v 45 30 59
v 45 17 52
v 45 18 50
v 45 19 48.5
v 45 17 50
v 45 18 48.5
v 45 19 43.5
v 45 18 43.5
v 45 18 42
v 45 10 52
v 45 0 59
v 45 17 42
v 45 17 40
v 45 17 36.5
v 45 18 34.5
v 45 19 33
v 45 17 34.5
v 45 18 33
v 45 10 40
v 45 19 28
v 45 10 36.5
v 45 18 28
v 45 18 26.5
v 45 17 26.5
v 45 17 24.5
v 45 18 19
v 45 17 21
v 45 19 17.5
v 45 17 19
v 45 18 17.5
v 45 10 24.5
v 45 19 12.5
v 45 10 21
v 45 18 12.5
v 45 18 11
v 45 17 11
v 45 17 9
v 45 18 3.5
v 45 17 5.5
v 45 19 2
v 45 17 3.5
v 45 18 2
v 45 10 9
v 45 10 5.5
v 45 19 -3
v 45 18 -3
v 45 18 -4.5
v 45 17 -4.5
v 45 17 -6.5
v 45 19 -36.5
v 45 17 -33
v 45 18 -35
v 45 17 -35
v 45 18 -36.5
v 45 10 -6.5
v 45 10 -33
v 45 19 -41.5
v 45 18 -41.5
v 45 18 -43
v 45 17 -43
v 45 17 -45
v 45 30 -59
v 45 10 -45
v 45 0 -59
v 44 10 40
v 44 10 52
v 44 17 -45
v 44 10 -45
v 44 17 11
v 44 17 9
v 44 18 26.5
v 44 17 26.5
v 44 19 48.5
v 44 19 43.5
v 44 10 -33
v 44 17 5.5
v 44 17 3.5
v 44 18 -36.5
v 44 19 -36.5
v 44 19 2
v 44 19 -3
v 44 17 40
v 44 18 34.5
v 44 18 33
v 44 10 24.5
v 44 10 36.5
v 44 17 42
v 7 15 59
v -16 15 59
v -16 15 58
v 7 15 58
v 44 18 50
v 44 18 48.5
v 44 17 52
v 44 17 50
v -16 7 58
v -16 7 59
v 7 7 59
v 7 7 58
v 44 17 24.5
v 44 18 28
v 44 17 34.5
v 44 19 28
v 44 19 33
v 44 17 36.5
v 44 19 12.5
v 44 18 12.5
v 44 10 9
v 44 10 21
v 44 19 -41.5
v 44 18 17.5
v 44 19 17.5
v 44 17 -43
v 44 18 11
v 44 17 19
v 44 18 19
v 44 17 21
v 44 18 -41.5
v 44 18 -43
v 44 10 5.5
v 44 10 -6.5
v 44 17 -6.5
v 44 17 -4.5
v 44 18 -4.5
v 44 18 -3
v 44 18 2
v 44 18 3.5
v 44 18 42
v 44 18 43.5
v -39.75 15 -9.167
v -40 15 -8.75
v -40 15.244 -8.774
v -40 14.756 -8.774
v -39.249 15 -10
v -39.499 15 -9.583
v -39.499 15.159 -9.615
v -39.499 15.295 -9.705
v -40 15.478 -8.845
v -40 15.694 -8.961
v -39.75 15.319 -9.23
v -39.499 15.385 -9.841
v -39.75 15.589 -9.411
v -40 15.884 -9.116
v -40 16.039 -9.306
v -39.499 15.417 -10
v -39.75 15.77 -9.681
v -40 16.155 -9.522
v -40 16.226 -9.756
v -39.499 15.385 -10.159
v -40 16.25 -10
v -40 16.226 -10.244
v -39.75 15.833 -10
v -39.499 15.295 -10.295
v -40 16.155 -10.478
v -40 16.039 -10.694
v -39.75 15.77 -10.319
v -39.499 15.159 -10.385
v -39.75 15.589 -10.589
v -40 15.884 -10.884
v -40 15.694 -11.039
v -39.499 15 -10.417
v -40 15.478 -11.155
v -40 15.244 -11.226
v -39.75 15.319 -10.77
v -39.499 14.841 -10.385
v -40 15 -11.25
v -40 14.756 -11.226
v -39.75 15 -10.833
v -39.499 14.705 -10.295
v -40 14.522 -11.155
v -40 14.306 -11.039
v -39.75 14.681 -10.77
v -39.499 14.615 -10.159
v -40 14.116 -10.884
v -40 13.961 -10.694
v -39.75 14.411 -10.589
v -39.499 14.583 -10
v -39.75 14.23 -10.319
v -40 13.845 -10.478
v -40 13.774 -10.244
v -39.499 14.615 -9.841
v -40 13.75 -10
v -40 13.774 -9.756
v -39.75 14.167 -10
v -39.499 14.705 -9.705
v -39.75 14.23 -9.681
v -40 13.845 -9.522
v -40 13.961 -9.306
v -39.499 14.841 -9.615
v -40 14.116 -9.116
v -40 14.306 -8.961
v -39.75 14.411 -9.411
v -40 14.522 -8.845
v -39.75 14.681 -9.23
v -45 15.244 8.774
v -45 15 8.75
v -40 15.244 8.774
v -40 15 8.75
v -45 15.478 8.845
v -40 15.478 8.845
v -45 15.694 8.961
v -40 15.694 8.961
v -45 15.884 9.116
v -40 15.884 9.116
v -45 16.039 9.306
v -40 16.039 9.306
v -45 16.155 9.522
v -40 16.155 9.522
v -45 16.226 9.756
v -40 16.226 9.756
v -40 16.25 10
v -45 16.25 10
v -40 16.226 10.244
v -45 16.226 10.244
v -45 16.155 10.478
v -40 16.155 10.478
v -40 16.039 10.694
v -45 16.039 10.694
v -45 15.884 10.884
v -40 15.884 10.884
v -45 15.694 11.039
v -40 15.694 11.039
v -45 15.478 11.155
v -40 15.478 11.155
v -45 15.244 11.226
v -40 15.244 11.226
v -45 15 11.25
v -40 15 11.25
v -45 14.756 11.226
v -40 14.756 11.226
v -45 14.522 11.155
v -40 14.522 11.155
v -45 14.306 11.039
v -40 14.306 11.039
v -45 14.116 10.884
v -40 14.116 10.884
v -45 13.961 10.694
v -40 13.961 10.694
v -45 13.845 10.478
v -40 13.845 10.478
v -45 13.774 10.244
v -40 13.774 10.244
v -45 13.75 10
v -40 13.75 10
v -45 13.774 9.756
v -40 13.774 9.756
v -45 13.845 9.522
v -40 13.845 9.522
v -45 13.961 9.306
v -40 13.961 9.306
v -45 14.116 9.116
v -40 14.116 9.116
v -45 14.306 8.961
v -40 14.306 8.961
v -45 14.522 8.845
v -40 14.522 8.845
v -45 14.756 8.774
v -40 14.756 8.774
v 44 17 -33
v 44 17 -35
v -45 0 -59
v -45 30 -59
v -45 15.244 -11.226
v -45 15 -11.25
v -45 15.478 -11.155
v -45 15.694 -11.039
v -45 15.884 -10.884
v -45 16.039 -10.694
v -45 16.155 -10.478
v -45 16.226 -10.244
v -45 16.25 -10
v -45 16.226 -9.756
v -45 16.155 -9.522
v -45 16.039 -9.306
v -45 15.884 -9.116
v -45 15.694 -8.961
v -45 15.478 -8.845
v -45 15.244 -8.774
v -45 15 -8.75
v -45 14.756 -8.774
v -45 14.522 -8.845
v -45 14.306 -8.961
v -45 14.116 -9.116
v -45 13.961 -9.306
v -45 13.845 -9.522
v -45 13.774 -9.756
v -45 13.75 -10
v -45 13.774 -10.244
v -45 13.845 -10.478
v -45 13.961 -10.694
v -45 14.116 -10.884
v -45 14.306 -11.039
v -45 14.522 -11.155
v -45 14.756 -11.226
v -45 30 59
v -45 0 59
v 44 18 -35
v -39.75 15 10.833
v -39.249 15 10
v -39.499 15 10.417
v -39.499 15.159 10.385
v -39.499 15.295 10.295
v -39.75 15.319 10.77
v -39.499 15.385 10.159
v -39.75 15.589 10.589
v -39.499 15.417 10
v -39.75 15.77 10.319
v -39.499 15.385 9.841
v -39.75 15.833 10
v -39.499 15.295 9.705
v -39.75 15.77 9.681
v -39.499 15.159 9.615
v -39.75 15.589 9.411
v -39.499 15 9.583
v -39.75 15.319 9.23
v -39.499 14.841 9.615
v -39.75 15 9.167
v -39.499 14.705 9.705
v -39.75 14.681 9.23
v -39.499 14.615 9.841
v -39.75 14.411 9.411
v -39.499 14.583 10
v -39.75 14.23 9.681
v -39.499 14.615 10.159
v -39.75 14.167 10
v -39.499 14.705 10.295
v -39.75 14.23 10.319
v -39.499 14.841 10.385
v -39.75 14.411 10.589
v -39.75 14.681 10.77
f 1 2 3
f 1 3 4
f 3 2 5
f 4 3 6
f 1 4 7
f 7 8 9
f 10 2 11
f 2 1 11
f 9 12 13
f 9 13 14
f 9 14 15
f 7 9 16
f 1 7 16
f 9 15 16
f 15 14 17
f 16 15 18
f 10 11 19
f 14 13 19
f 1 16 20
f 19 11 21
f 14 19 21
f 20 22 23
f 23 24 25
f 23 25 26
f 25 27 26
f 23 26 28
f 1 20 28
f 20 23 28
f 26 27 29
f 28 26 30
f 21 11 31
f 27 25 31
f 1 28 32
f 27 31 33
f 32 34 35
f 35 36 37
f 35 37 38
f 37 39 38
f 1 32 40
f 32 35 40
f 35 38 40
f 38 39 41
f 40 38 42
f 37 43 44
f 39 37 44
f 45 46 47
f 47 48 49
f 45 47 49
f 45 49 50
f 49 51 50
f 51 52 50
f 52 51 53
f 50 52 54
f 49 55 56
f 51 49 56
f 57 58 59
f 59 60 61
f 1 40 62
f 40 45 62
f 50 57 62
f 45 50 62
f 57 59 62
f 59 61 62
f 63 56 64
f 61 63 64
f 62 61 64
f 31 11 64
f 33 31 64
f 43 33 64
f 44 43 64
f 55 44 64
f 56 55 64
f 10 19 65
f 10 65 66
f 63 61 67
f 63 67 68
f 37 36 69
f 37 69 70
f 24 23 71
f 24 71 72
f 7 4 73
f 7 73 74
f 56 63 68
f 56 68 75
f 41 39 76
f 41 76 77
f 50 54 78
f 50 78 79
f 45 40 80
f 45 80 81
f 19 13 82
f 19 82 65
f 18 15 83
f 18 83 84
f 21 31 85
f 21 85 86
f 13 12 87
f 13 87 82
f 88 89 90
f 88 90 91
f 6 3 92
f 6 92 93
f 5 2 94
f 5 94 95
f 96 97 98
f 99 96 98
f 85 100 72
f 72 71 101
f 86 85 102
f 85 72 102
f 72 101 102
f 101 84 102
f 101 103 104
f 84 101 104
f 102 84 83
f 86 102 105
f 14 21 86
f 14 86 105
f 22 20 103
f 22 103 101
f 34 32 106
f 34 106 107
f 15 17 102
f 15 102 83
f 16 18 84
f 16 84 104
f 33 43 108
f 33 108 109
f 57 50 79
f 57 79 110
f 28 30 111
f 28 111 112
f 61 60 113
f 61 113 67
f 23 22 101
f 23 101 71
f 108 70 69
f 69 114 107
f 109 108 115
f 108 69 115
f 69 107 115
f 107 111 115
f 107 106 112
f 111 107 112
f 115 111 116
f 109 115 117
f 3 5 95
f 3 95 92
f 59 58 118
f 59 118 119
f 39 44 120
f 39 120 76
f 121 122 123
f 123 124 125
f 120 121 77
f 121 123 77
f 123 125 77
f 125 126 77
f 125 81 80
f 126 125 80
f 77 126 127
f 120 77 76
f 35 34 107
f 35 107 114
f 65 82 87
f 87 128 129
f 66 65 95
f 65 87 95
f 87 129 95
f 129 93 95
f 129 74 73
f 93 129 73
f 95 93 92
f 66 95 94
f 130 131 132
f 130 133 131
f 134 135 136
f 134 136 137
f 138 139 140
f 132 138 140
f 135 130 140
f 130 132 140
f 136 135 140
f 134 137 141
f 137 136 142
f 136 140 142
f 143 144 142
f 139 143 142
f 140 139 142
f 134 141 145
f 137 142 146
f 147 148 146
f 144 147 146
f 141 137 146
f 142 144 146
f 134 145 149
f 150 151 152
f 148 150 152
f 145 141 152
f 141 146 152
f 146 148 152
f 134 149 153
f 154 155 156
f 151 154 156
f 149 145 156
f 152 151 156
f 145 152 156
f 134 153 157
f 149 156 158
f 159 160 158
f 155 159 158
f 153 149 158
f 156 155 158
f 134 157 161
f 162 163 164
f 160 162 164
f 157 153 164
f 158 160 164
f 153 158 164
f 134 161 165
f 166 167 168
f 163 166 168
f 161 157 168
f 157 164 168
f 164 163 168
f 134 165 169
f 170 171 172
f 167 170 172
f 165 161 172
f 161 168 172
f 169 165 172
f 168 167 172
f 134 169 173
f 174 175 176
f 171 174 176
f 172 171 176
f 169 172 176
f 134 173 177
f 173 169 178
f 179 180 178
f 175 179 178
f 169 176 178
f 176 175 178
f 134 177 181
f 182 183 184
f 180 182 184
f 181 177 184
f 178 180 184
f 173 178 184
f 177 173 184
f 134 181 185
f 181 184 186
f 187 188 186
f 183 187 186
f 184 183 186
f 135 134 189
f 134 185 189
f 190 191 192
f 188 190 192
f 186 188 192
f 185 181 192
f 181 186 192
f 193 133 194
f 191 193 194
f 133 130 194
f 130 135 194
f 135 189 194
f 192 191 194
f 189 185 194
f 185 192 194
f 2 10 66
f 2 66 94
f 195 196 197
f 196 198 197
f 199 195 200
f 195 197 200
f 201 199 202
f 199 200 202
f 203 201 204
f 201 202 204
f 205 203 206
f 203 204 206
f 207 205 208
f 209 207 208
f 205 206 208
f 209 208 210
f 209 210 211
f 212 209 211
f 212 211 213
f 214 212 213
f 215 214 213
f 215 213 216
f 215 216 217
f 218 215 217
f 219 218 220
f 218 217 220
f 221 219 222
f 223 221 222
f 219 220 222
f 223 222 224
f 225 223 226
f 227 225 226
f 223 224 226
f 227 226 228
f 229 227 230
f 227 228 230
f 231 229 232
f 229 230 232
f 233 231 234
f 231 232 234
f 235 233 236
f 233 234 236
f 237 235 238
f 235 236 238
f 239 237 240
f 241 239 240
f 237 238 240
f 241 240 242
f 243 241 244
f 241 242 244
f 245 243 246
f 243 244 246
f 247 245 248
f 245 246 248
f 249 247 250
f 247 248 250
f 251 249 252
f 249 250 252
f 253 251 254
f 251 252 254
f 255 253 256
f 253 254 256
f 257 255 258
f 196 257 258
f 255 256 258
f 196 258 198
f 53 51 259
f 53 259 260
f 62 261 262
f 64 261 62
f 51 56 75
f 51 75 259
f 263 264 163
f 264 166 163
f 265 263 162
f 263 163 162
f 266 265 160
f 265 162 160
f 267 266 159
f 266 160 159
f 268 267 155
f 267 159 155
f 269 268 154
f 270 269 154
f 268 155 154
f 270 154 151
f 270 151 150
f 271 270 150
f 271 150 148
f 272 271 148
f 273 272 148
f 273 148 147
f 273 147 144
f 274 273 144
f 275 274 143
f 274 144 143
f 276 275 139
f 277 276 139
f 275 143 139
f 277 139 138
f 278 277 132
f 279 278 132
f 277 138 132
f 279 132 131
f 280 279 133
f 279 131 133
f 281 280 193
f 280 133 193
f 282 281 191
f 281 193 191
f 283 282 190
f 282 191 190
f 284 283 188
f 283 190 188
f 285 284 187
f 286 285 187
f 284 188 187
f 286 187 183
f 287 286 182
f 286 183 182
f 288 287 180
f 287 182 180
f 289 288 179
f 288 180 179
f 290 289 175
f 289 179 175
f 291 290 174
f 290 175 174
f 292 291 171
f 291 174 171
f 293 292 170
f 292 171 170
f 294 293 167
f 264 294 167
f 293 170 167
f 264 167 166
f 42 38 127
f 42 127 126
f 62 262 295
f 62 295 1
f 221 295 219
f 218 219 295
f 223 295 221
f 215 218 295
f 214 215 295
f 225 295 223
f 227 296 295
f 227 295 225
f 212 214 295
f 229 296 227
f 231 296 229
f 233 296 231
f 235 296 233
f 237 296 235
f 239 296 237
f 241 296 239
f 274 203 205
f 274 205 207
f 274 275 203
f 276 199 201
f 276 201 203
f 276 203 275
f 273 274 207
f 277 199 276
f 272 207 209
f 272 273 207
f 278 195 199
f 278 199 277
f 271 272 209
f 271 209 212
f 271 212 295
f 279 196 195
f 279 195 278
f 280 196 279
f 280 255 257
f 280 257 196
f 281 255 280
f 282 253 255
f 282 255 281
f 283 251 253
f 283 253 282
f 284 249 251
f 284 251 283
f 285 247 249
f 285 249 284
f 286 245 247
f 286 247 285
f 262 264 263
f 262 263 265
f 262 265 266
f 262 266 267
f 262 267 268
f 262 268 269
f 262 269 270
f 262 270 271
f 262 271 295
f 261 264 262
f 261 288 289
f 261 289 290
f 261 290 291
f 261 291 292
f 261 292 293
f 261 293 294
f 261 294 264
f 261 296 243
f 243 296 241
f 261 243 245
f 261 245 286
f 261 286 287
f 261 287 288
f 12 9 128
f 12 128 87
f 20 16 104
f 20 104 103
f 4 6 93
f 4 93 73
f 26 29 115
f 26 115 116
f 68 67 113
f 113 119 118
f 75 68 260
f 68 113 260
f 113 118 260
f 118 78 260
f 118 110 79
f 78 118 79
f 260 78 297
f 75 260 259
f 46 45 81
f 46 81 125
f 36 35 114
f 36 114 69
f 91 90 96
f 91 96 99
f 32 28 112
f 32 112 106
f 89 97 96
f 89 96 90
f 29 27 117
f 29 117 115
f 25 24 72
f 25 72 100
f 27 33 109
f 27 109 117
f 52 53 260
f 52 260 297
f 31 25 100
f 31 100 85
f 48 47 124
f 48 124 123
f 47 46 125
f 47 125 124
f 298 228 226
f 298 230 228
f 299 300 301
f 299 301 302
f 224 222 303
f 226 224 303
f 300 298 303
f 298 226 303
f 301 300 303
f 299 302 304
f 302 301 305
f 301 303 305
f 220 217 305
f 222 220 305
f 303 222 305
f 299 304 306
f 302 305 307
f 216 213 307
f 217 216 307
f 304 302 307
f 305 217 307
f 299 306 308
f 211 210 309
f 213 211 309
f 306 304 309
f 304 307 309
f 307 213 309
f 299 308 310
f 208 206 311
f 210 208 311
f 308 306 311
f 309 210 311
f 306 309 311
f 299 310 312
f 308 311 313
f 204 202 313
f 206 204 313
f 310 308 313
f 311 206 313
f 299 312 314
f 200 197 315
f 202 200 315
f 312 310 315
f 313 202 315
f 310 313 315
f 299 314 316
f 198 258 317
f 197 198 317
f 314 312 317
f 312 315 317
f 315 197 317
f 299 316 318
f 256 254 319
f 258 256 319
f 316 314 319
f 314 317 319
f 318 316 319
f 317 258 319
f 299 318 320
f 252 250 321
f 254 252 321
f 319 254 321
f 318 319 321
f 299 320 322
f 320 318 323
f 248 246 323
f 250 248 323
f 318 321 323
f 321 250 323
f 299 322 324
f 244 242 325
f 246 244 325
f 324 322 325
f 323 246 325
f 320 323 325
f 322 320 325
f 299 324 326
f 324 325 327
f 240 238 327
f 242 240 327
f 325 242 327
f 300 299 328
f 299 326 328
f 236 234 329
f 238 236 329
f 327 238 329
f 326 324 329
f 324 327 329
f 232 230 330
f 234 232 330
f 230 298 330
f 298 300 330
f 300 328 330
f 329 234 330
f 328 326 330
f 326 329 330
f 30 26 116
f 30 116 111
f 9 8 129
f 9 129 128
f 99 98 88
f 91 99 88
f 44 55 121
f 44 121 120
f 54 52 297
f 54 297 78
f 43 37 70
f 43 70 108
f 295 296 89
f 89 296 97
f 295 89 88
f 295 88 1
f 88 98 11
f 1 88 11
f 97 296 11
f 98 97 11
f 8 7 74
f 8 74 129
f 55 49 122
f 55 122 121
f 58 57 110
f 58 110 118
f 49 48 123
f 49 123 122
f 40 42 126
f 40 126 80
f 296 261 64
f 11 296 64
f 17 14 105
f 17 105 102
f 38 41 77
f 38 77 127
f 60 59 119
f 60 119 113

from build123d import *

# Parameters (mm, degrees)
SKETCH_1_W             = 90
SKETCH_1_H             = 118
EXTRUDE_1_DEPTH        = 30
HOLE_WIZARD_M3_1_D     = 2.5
HOLE_WIZARD_M3_1_DEPTH = 5
HOLE_WIZARD_M3_1_TIP   = 0.751075774
SKETCH_5_W             = 23
SKETCH_5_H             = 8
CUT_EXTRUDE_1_DEPTH    = 1
CUT_EXTRUDE_2_DEPTH    = 1


with BuildPart() as part:
    # 草图1 → 凸台-拉伸1 (new body)
    with BuildSketch(Plane(origin=(0, 0, 0), x_dir=(1, 0, 0), z_dir=(0, 1, 0))):
        Rectangle(SKETCH_1_W, SKETCH_1_H)
    extrude(amount=EXTRUDE_1_DEPTH)

    # M3 螺纹孔的螺纹孔钻头1
    with Locations(Plane.ZY.offset(45)):
        with Locations((10, 15), (-10, 15)):
            Hole(HOLE_WIZARD_M3_1_D / 2, depth=HOLE_WIZARD_M3_1_DEPTH)
            with Locations((0, 0, -(HOLE_WIZARD_M3_1_DEPTH + HOLE_WIZARD_M3_1_TIP / 2))):  # 118° drill point
                Cone(0, HOLE_WIZARD_M3_1_D / 2, HOLE_WIZARD_M3_1_TIP, mode=Mode.SUBTRACT)

    # 草图5 → 切除-拉伸1 (cut)
    with BuildSketch(Plane.XY.offset(59)):
        with Locations((-4.5, 11)):
            Rectangle(SKETCH_5_W, SKETCH_5_H)
    extrude(amount=-CUT_EXTRUDE_1_DEPTH, mode=Mode.SUBTRACT)

    # 草图6 → 切除-拉伸2 (cut)
    with BuildSketch(Plane(origin=(45, 0, 0), x_dir=(0, 0, -1), z_dir=(1, 0, 0))):
        Polygon((-40, 10), (-52, 10), (-52, 17), (-50, 17), (-50, 18), (-48.5, 18), (-48.5, 19), (-43.5, 19), (-43.5, 18), (-42, 18), (-42, 17), (-40, 17), align=None)
        Polygon((-24.5, 10), (-36.5, 10), (-36.5, 17), (-34.5, 17), (-34.5, 18), (-33, 18), (-33, 19), (-28, 19), (-28, 18), (-26.5, 18), (-26.5, 17), (-24.5, 17), align=None)
        Polygon((-9, 10), (-21, 10), (-21, 17), (-19, 17), (-19, 18), (-17.5, 18), (-17.5, 19), (-12.5, 19), (-12.5, 18), (-11, 18), (-11, 17), (-9, 17), align=None)
        Polygon((6.5, 10), (-5.5, 10), (-5.5, 17), (-3.5, 17), (-3.5, 18), (-2, 18), (-2, 19), (3, 19), (3, 18), (4.5, 18), (4.5, 17), (6.5, 17), align=None)
        Polygon((33, 10), (33, 17), (35, 17), (35, 18), (36.5, 18), (36.5, 19), (41.5, 19), (41.5, 18), (43, 18), (43, 17), (45, 17), (45, 10), align=None)
    extrude(amount=-CUT_EXTRUDE_2_DEPTH, mode=Mode.SUBTRACT)


solid = part.part
